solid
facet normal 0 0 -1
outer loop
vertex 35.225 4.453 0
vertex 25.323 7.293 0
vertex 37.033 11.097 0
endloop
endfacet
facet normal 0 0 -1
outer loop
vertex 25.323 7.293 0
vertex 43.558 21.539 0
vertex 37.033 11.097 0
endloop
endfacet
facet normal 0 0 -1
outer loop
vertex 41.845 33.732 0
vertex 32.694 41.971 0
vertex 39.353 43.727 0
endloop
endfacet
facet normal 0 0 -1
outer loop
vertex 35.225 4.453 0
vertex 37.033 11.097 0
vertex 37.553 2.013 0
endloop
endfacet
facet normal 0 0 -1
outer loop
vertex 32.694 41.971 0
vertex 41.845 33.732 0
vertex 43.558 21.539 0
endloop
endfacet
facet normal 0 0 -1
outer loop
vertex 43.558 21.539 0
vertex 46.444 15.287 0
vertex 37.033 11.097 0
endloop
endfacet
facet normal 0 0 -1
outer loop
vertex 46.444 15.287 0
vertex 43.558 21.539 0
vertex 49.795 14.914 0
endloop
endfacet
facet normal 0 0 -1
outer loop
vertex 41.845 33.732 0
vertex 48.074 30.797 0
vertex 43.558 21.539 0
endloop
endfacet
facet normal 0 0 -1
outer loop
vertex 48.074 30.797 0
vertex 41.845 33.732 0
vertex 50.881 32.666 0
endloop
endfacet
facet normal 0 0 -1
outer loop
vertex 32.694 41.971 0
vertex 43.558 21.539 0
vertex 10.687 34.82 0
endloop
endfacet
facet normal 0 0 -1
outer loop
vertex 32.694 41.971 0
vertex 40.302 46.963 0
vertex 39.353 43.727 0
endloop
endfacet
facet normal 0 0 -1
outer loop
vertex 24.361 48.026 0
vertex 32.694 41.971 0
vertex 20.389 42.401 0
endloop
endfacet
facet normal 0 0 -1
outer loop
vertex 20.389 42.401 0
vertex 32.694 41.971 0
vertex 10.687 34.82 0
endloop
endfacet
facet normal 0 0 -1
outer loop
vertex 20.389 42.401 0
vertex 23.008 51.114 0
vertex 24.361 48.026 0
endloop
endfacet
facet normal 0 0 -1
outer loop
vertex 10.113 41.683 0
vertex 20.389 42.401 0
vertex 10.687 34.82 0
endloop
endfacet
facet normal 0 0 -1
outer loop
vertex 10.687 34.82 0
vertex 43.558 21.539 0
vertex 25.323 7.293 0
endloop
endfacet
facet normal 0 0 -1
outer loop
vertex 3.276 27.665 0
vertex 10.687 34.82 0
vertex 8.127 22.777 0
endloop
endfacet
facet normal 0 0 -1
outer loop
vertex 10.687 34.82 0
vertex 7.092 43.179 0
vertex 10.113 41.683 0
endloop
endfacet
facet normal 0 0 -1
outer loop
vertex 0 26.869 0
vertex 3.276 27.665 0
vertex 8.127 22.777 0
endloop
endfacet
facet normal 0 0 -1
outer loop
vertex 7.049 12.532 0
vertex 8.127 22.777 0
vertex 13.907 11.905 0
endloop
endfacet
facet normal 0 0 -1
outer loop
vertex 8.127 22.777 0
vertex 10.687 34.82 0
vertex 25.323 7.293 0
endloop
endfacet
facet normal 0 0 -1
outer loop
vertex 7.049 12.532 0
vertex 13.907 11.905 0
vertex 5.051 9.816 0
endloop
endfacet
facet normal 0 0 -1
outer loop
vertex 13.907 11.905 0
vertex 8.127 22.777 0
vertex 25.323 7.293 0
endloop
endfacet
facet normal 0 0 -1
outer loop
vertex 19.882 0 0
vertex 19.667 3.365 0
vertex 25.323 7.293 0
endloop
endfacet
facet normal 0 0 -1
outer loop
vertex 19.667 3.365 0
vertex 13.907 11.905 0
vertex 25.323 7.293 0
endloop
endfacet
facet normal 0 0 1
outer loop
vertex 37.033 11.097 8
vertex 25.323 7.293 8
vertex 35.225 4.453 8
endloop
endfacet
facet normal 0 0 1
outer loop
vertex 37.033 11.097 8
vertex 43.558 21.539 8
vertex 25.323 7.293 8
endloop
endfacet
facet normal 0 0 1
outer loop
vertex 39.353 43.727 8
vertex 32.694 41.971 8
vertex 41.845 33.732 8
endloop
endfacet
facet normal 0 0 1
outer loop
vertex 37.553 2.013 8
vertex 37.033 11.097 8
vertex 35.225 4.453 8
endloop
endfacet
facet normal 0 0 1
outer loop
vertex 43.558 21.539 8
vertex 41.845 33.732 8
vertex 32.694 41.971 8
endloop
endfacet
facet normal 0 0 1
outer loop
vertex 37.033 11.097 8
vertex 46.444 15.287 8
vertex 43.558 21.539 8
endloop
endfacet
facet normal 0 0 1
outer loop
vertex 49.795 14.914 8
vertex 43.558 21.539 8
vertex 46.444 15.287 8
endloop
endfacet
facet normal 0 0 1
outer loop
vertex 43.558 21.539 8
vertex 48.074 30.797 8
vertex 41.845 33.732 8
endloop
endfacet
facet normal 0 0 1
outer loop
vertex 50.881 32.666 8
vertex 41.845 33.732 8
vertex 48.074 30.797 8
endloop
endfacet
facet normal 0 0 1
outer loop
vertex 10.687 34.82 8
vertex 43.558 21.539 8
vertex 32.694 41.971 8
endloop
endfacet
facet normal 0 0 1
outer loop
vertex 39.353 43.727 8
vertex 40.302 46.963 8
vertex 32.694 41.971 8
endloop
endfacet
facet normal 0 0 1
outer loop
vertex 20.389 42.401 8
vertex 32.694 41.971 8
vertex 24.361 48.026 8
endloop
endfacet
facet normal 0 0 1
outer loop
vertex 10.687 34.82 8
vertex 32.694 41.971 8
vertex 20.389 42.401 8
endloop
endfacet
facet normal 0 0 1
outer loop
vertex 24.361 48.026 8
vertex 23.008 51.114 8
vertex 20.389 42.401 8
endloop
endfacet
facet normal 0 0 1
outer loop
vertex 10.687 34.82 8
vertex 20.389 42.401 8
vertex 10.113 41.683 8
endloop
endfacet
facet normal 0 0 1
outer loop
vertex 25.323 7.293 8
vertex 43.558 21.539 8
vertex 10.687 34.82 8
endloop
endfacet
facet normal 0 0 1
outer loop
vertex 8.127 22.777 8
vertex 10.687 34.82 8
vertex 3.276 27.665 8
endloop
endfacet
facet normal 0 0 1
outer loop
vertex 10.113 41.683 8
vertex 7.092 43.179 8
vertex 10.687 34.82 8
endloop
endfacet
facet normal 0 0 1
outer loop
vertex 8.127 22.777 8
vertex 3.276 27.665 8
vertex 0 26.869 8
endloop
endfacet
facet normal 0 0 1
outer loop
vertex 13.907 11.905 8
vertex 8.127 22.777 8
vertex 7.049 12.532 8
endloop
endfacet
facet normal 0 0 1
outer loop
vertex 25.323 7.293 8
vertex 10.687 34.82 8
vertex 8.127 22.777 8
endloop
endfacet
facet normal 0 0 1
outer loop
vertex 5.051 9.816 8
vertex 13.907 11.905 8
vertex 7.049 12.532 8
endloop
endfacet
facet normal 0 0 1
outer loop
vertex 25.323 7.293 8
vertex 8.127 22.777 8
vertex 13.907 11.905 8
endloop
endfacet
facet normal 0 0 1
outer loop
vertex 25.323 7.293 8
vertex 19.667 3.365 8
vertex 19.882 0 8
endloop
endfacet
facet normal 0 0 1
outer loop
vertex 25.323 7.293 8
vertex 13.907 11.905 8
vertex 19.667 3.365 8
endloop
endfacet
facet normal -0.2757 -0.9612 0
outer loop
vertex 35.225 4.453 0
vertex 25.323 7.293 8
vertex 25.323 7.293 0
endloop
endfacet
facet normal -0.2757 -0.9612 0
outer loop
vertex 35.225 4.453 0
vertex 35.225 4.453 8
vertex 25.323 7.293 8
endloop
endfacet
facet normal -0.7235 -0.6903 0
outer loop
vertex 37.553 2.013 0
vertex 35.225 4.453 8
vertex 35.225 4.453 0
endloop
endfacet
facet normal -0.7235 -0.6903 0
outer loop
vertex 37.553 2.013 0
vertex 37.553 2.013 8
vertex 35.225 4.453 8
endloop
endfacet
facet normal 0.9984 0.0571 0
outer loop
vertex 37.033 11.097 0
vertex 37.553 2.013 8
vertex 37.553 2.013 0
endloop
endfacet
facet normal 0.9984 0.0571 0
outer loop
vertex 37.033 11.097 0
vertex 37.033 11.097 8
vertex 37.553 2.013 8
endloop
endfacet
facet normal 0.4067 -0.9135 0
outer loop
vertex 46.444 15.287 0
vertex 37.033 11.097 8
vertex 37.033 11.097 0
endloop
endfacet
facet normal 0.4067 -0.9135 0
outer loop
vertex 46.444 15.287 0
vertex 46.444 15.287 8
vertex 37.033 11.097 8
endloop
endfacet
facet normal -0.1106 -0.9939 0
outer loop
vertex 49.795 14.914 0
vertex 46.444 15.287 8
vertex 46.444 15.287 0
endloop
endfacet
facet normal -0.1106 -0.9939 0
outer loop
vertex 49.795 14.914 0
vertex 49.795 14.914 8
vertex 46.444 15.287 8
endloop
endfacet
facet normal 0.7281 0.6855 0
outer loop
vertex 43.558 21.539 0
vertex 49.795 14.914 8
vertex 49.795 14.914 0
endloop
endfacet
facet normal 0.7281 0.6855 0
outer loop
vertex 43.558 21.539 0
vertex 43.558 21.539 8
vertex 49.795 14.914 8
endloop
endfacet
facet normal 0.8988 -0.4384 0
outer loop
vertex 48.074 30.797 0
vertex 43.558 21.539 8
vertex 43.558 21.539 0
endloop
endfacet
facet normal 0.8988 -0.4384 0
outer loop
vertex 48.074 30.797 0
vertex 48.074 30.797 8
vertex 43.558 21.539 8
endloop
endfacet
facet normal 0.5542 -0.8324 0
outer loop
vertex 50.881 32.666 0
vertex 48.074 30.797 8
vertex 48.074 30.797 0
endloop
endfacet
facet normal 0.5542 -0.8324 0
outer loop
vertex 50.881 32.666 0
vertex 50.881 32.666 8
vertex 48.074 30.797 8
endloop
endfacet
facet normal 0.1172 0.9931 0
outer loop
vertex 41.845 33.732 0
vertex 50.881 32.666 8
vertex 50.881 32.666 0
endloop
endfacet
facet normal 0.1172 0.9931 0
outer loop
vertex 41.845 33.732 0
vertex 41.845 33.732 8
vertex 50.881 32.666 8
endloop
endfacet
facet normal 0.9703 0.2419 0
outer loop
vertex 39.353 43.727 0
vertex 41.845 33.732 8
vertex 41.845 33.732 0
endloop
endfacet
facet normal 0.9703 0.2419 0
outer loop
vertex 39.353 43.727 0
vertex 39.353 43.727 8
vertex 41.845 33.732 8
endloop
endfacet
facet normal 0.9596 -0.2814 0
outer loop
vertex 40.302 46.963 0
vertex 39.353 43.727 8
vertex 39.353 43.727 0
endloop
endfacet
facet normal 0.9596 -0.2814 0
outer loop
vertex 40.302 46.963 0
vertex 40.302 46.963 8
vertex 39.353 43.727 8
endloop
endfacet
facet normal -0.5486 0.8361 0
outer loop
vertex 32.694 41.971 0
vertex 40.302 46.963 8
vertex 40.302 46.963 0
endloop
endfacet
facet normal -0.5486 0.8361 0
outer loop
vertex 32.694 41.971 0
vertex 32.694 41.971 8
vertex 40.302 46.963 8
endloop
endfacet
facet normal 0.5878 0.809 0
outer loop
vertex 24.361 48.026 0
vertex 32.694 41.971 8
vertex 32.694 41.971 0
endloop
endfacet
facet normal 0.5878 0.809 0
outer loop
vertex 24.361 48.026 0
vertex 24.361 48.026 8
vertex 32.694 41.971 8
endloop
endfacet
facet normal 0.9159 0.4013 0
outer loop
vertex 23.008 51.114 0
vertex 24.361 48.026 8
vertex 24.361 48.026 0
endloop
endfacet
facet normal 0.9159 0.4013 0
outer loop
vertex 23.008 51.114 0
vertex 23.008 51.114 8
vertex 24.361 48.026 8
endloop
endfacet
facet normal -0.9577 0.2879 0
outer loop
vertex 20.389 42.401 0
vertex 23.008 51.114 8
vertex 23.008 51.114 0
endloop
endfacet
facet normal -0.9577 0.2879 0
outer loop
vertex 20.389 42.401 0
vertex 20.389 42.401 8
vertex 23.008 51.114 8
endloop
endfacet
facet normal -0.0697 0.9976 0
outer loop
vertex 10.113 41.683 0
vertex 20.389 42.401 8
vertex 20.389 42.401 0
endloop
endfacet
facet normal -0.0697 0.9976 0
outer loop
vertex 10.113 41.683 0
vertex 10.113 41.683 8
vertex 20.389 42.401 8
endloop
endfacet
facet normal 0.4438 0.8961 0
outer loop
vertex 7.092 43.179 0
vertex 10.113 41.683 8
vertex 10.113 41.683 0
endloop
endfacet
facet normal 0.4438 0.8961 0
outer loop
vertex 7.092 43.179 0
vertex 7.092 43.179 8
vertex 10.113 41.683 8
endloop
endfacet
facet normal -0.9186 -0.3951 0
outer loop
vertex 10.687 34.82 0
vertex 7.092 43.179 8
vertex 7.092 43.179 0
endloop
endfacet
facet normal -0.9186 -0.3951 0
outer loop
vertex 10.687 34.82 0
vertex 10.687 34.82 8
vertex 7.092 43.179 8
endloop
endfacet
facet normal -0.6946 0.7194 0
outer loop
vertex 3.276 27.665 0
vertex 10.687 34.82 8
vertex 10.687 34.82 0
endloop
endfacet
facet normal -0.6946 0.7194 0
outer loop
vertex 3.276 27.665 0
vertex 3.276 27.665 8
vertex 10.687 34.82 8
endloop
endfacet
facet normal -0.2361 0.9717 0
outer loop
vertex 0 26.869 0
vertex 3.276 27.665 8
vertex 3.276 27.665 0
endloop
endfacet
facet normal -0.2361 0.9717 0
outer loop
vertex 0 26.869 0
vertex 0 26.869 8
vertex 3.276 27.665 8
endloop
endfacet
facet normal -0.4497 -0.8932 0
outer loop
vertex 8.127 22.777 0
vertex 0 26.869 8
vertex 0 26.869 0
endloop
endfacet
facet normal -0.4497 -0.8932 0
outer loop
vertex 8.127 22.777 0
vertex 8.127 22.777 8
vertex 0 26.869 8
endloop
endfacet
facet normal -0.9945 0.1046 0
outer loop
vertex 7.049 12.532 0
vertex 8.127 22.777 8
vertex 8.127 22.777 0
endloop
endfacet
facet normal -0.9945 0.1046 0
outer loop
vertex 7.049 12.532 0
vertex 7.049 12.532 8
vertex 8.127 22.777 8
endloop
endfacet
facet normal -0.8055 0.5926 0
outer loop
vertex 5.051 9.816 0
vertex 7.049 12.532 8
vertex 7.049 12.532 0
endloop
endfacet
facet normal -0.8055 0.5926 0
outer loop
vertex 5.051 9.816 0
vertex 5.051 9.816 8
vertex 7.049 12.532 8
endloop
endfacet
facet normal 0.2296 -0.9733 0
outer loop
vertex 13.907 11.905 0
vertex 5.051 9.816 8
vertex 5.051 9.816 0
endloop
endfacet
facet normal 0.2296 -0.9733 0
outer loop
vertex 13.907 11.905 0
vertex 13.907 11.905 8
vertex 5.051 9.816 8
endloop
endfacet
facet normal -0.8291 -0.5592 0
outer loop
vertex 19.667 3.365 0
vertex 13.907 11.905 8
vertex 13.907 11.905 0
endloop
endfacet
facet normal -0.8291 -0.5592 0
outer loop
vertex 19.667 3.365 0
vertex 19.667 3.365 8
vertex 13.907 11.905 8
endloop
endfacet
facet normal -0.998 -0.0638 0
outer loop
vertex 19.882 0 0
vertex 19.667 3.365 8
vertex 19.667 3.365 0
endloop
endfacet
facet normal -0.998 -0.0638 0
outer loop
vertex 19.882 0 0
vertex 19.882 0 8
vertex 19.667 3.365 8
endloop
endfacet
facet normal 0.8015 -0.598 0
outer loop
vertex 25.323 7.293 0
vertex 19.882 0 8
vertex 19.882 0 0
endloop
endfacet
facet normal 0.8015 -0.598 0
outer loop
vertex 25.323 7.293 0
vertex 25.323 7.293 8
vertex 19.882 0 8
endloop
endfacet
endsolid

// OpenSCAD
$fn = 32;

// ----------------------------------------------------------------------
// Fan rotor section: 9 blades, 18 mm hub radius, 8 mm blades
// ----------------------------------------------------------------------

// --- parameters (mm) ---
profile_height = 8;       // extrusion height
profile_points = 27;      // points of the closed outline

profile = [[43.558, 21.539], [48.074, 30.797], [50.881, 32.666], [41.845, 33.732], [39.353, 43.727], [40.302, 46.963], [32.694, 41.971], [24.361, 48.026], [23.008, 51.114], [20.389, 42.401], [10.113, 41.683], [7.092, 43.179], [10.687, 34.82], [3.276, 27.665], [0, 26.869], [8.127, 22.777], [7.049, 12.532], [5.051, 9.816], [13.907, 11.905], [19.667, 3.365], [19.882, 0], [25.323, 7.293], [35.225, 4.453], [37.553, 2.013], [37.033, 11.097], [46.444, 15.287], [49.795, 14.914]];  // single closed polygon, 27 points, counter clockwise

// --- the one profile operation ---
linear_extrude(height = profile_height) polygon(points = profile);
